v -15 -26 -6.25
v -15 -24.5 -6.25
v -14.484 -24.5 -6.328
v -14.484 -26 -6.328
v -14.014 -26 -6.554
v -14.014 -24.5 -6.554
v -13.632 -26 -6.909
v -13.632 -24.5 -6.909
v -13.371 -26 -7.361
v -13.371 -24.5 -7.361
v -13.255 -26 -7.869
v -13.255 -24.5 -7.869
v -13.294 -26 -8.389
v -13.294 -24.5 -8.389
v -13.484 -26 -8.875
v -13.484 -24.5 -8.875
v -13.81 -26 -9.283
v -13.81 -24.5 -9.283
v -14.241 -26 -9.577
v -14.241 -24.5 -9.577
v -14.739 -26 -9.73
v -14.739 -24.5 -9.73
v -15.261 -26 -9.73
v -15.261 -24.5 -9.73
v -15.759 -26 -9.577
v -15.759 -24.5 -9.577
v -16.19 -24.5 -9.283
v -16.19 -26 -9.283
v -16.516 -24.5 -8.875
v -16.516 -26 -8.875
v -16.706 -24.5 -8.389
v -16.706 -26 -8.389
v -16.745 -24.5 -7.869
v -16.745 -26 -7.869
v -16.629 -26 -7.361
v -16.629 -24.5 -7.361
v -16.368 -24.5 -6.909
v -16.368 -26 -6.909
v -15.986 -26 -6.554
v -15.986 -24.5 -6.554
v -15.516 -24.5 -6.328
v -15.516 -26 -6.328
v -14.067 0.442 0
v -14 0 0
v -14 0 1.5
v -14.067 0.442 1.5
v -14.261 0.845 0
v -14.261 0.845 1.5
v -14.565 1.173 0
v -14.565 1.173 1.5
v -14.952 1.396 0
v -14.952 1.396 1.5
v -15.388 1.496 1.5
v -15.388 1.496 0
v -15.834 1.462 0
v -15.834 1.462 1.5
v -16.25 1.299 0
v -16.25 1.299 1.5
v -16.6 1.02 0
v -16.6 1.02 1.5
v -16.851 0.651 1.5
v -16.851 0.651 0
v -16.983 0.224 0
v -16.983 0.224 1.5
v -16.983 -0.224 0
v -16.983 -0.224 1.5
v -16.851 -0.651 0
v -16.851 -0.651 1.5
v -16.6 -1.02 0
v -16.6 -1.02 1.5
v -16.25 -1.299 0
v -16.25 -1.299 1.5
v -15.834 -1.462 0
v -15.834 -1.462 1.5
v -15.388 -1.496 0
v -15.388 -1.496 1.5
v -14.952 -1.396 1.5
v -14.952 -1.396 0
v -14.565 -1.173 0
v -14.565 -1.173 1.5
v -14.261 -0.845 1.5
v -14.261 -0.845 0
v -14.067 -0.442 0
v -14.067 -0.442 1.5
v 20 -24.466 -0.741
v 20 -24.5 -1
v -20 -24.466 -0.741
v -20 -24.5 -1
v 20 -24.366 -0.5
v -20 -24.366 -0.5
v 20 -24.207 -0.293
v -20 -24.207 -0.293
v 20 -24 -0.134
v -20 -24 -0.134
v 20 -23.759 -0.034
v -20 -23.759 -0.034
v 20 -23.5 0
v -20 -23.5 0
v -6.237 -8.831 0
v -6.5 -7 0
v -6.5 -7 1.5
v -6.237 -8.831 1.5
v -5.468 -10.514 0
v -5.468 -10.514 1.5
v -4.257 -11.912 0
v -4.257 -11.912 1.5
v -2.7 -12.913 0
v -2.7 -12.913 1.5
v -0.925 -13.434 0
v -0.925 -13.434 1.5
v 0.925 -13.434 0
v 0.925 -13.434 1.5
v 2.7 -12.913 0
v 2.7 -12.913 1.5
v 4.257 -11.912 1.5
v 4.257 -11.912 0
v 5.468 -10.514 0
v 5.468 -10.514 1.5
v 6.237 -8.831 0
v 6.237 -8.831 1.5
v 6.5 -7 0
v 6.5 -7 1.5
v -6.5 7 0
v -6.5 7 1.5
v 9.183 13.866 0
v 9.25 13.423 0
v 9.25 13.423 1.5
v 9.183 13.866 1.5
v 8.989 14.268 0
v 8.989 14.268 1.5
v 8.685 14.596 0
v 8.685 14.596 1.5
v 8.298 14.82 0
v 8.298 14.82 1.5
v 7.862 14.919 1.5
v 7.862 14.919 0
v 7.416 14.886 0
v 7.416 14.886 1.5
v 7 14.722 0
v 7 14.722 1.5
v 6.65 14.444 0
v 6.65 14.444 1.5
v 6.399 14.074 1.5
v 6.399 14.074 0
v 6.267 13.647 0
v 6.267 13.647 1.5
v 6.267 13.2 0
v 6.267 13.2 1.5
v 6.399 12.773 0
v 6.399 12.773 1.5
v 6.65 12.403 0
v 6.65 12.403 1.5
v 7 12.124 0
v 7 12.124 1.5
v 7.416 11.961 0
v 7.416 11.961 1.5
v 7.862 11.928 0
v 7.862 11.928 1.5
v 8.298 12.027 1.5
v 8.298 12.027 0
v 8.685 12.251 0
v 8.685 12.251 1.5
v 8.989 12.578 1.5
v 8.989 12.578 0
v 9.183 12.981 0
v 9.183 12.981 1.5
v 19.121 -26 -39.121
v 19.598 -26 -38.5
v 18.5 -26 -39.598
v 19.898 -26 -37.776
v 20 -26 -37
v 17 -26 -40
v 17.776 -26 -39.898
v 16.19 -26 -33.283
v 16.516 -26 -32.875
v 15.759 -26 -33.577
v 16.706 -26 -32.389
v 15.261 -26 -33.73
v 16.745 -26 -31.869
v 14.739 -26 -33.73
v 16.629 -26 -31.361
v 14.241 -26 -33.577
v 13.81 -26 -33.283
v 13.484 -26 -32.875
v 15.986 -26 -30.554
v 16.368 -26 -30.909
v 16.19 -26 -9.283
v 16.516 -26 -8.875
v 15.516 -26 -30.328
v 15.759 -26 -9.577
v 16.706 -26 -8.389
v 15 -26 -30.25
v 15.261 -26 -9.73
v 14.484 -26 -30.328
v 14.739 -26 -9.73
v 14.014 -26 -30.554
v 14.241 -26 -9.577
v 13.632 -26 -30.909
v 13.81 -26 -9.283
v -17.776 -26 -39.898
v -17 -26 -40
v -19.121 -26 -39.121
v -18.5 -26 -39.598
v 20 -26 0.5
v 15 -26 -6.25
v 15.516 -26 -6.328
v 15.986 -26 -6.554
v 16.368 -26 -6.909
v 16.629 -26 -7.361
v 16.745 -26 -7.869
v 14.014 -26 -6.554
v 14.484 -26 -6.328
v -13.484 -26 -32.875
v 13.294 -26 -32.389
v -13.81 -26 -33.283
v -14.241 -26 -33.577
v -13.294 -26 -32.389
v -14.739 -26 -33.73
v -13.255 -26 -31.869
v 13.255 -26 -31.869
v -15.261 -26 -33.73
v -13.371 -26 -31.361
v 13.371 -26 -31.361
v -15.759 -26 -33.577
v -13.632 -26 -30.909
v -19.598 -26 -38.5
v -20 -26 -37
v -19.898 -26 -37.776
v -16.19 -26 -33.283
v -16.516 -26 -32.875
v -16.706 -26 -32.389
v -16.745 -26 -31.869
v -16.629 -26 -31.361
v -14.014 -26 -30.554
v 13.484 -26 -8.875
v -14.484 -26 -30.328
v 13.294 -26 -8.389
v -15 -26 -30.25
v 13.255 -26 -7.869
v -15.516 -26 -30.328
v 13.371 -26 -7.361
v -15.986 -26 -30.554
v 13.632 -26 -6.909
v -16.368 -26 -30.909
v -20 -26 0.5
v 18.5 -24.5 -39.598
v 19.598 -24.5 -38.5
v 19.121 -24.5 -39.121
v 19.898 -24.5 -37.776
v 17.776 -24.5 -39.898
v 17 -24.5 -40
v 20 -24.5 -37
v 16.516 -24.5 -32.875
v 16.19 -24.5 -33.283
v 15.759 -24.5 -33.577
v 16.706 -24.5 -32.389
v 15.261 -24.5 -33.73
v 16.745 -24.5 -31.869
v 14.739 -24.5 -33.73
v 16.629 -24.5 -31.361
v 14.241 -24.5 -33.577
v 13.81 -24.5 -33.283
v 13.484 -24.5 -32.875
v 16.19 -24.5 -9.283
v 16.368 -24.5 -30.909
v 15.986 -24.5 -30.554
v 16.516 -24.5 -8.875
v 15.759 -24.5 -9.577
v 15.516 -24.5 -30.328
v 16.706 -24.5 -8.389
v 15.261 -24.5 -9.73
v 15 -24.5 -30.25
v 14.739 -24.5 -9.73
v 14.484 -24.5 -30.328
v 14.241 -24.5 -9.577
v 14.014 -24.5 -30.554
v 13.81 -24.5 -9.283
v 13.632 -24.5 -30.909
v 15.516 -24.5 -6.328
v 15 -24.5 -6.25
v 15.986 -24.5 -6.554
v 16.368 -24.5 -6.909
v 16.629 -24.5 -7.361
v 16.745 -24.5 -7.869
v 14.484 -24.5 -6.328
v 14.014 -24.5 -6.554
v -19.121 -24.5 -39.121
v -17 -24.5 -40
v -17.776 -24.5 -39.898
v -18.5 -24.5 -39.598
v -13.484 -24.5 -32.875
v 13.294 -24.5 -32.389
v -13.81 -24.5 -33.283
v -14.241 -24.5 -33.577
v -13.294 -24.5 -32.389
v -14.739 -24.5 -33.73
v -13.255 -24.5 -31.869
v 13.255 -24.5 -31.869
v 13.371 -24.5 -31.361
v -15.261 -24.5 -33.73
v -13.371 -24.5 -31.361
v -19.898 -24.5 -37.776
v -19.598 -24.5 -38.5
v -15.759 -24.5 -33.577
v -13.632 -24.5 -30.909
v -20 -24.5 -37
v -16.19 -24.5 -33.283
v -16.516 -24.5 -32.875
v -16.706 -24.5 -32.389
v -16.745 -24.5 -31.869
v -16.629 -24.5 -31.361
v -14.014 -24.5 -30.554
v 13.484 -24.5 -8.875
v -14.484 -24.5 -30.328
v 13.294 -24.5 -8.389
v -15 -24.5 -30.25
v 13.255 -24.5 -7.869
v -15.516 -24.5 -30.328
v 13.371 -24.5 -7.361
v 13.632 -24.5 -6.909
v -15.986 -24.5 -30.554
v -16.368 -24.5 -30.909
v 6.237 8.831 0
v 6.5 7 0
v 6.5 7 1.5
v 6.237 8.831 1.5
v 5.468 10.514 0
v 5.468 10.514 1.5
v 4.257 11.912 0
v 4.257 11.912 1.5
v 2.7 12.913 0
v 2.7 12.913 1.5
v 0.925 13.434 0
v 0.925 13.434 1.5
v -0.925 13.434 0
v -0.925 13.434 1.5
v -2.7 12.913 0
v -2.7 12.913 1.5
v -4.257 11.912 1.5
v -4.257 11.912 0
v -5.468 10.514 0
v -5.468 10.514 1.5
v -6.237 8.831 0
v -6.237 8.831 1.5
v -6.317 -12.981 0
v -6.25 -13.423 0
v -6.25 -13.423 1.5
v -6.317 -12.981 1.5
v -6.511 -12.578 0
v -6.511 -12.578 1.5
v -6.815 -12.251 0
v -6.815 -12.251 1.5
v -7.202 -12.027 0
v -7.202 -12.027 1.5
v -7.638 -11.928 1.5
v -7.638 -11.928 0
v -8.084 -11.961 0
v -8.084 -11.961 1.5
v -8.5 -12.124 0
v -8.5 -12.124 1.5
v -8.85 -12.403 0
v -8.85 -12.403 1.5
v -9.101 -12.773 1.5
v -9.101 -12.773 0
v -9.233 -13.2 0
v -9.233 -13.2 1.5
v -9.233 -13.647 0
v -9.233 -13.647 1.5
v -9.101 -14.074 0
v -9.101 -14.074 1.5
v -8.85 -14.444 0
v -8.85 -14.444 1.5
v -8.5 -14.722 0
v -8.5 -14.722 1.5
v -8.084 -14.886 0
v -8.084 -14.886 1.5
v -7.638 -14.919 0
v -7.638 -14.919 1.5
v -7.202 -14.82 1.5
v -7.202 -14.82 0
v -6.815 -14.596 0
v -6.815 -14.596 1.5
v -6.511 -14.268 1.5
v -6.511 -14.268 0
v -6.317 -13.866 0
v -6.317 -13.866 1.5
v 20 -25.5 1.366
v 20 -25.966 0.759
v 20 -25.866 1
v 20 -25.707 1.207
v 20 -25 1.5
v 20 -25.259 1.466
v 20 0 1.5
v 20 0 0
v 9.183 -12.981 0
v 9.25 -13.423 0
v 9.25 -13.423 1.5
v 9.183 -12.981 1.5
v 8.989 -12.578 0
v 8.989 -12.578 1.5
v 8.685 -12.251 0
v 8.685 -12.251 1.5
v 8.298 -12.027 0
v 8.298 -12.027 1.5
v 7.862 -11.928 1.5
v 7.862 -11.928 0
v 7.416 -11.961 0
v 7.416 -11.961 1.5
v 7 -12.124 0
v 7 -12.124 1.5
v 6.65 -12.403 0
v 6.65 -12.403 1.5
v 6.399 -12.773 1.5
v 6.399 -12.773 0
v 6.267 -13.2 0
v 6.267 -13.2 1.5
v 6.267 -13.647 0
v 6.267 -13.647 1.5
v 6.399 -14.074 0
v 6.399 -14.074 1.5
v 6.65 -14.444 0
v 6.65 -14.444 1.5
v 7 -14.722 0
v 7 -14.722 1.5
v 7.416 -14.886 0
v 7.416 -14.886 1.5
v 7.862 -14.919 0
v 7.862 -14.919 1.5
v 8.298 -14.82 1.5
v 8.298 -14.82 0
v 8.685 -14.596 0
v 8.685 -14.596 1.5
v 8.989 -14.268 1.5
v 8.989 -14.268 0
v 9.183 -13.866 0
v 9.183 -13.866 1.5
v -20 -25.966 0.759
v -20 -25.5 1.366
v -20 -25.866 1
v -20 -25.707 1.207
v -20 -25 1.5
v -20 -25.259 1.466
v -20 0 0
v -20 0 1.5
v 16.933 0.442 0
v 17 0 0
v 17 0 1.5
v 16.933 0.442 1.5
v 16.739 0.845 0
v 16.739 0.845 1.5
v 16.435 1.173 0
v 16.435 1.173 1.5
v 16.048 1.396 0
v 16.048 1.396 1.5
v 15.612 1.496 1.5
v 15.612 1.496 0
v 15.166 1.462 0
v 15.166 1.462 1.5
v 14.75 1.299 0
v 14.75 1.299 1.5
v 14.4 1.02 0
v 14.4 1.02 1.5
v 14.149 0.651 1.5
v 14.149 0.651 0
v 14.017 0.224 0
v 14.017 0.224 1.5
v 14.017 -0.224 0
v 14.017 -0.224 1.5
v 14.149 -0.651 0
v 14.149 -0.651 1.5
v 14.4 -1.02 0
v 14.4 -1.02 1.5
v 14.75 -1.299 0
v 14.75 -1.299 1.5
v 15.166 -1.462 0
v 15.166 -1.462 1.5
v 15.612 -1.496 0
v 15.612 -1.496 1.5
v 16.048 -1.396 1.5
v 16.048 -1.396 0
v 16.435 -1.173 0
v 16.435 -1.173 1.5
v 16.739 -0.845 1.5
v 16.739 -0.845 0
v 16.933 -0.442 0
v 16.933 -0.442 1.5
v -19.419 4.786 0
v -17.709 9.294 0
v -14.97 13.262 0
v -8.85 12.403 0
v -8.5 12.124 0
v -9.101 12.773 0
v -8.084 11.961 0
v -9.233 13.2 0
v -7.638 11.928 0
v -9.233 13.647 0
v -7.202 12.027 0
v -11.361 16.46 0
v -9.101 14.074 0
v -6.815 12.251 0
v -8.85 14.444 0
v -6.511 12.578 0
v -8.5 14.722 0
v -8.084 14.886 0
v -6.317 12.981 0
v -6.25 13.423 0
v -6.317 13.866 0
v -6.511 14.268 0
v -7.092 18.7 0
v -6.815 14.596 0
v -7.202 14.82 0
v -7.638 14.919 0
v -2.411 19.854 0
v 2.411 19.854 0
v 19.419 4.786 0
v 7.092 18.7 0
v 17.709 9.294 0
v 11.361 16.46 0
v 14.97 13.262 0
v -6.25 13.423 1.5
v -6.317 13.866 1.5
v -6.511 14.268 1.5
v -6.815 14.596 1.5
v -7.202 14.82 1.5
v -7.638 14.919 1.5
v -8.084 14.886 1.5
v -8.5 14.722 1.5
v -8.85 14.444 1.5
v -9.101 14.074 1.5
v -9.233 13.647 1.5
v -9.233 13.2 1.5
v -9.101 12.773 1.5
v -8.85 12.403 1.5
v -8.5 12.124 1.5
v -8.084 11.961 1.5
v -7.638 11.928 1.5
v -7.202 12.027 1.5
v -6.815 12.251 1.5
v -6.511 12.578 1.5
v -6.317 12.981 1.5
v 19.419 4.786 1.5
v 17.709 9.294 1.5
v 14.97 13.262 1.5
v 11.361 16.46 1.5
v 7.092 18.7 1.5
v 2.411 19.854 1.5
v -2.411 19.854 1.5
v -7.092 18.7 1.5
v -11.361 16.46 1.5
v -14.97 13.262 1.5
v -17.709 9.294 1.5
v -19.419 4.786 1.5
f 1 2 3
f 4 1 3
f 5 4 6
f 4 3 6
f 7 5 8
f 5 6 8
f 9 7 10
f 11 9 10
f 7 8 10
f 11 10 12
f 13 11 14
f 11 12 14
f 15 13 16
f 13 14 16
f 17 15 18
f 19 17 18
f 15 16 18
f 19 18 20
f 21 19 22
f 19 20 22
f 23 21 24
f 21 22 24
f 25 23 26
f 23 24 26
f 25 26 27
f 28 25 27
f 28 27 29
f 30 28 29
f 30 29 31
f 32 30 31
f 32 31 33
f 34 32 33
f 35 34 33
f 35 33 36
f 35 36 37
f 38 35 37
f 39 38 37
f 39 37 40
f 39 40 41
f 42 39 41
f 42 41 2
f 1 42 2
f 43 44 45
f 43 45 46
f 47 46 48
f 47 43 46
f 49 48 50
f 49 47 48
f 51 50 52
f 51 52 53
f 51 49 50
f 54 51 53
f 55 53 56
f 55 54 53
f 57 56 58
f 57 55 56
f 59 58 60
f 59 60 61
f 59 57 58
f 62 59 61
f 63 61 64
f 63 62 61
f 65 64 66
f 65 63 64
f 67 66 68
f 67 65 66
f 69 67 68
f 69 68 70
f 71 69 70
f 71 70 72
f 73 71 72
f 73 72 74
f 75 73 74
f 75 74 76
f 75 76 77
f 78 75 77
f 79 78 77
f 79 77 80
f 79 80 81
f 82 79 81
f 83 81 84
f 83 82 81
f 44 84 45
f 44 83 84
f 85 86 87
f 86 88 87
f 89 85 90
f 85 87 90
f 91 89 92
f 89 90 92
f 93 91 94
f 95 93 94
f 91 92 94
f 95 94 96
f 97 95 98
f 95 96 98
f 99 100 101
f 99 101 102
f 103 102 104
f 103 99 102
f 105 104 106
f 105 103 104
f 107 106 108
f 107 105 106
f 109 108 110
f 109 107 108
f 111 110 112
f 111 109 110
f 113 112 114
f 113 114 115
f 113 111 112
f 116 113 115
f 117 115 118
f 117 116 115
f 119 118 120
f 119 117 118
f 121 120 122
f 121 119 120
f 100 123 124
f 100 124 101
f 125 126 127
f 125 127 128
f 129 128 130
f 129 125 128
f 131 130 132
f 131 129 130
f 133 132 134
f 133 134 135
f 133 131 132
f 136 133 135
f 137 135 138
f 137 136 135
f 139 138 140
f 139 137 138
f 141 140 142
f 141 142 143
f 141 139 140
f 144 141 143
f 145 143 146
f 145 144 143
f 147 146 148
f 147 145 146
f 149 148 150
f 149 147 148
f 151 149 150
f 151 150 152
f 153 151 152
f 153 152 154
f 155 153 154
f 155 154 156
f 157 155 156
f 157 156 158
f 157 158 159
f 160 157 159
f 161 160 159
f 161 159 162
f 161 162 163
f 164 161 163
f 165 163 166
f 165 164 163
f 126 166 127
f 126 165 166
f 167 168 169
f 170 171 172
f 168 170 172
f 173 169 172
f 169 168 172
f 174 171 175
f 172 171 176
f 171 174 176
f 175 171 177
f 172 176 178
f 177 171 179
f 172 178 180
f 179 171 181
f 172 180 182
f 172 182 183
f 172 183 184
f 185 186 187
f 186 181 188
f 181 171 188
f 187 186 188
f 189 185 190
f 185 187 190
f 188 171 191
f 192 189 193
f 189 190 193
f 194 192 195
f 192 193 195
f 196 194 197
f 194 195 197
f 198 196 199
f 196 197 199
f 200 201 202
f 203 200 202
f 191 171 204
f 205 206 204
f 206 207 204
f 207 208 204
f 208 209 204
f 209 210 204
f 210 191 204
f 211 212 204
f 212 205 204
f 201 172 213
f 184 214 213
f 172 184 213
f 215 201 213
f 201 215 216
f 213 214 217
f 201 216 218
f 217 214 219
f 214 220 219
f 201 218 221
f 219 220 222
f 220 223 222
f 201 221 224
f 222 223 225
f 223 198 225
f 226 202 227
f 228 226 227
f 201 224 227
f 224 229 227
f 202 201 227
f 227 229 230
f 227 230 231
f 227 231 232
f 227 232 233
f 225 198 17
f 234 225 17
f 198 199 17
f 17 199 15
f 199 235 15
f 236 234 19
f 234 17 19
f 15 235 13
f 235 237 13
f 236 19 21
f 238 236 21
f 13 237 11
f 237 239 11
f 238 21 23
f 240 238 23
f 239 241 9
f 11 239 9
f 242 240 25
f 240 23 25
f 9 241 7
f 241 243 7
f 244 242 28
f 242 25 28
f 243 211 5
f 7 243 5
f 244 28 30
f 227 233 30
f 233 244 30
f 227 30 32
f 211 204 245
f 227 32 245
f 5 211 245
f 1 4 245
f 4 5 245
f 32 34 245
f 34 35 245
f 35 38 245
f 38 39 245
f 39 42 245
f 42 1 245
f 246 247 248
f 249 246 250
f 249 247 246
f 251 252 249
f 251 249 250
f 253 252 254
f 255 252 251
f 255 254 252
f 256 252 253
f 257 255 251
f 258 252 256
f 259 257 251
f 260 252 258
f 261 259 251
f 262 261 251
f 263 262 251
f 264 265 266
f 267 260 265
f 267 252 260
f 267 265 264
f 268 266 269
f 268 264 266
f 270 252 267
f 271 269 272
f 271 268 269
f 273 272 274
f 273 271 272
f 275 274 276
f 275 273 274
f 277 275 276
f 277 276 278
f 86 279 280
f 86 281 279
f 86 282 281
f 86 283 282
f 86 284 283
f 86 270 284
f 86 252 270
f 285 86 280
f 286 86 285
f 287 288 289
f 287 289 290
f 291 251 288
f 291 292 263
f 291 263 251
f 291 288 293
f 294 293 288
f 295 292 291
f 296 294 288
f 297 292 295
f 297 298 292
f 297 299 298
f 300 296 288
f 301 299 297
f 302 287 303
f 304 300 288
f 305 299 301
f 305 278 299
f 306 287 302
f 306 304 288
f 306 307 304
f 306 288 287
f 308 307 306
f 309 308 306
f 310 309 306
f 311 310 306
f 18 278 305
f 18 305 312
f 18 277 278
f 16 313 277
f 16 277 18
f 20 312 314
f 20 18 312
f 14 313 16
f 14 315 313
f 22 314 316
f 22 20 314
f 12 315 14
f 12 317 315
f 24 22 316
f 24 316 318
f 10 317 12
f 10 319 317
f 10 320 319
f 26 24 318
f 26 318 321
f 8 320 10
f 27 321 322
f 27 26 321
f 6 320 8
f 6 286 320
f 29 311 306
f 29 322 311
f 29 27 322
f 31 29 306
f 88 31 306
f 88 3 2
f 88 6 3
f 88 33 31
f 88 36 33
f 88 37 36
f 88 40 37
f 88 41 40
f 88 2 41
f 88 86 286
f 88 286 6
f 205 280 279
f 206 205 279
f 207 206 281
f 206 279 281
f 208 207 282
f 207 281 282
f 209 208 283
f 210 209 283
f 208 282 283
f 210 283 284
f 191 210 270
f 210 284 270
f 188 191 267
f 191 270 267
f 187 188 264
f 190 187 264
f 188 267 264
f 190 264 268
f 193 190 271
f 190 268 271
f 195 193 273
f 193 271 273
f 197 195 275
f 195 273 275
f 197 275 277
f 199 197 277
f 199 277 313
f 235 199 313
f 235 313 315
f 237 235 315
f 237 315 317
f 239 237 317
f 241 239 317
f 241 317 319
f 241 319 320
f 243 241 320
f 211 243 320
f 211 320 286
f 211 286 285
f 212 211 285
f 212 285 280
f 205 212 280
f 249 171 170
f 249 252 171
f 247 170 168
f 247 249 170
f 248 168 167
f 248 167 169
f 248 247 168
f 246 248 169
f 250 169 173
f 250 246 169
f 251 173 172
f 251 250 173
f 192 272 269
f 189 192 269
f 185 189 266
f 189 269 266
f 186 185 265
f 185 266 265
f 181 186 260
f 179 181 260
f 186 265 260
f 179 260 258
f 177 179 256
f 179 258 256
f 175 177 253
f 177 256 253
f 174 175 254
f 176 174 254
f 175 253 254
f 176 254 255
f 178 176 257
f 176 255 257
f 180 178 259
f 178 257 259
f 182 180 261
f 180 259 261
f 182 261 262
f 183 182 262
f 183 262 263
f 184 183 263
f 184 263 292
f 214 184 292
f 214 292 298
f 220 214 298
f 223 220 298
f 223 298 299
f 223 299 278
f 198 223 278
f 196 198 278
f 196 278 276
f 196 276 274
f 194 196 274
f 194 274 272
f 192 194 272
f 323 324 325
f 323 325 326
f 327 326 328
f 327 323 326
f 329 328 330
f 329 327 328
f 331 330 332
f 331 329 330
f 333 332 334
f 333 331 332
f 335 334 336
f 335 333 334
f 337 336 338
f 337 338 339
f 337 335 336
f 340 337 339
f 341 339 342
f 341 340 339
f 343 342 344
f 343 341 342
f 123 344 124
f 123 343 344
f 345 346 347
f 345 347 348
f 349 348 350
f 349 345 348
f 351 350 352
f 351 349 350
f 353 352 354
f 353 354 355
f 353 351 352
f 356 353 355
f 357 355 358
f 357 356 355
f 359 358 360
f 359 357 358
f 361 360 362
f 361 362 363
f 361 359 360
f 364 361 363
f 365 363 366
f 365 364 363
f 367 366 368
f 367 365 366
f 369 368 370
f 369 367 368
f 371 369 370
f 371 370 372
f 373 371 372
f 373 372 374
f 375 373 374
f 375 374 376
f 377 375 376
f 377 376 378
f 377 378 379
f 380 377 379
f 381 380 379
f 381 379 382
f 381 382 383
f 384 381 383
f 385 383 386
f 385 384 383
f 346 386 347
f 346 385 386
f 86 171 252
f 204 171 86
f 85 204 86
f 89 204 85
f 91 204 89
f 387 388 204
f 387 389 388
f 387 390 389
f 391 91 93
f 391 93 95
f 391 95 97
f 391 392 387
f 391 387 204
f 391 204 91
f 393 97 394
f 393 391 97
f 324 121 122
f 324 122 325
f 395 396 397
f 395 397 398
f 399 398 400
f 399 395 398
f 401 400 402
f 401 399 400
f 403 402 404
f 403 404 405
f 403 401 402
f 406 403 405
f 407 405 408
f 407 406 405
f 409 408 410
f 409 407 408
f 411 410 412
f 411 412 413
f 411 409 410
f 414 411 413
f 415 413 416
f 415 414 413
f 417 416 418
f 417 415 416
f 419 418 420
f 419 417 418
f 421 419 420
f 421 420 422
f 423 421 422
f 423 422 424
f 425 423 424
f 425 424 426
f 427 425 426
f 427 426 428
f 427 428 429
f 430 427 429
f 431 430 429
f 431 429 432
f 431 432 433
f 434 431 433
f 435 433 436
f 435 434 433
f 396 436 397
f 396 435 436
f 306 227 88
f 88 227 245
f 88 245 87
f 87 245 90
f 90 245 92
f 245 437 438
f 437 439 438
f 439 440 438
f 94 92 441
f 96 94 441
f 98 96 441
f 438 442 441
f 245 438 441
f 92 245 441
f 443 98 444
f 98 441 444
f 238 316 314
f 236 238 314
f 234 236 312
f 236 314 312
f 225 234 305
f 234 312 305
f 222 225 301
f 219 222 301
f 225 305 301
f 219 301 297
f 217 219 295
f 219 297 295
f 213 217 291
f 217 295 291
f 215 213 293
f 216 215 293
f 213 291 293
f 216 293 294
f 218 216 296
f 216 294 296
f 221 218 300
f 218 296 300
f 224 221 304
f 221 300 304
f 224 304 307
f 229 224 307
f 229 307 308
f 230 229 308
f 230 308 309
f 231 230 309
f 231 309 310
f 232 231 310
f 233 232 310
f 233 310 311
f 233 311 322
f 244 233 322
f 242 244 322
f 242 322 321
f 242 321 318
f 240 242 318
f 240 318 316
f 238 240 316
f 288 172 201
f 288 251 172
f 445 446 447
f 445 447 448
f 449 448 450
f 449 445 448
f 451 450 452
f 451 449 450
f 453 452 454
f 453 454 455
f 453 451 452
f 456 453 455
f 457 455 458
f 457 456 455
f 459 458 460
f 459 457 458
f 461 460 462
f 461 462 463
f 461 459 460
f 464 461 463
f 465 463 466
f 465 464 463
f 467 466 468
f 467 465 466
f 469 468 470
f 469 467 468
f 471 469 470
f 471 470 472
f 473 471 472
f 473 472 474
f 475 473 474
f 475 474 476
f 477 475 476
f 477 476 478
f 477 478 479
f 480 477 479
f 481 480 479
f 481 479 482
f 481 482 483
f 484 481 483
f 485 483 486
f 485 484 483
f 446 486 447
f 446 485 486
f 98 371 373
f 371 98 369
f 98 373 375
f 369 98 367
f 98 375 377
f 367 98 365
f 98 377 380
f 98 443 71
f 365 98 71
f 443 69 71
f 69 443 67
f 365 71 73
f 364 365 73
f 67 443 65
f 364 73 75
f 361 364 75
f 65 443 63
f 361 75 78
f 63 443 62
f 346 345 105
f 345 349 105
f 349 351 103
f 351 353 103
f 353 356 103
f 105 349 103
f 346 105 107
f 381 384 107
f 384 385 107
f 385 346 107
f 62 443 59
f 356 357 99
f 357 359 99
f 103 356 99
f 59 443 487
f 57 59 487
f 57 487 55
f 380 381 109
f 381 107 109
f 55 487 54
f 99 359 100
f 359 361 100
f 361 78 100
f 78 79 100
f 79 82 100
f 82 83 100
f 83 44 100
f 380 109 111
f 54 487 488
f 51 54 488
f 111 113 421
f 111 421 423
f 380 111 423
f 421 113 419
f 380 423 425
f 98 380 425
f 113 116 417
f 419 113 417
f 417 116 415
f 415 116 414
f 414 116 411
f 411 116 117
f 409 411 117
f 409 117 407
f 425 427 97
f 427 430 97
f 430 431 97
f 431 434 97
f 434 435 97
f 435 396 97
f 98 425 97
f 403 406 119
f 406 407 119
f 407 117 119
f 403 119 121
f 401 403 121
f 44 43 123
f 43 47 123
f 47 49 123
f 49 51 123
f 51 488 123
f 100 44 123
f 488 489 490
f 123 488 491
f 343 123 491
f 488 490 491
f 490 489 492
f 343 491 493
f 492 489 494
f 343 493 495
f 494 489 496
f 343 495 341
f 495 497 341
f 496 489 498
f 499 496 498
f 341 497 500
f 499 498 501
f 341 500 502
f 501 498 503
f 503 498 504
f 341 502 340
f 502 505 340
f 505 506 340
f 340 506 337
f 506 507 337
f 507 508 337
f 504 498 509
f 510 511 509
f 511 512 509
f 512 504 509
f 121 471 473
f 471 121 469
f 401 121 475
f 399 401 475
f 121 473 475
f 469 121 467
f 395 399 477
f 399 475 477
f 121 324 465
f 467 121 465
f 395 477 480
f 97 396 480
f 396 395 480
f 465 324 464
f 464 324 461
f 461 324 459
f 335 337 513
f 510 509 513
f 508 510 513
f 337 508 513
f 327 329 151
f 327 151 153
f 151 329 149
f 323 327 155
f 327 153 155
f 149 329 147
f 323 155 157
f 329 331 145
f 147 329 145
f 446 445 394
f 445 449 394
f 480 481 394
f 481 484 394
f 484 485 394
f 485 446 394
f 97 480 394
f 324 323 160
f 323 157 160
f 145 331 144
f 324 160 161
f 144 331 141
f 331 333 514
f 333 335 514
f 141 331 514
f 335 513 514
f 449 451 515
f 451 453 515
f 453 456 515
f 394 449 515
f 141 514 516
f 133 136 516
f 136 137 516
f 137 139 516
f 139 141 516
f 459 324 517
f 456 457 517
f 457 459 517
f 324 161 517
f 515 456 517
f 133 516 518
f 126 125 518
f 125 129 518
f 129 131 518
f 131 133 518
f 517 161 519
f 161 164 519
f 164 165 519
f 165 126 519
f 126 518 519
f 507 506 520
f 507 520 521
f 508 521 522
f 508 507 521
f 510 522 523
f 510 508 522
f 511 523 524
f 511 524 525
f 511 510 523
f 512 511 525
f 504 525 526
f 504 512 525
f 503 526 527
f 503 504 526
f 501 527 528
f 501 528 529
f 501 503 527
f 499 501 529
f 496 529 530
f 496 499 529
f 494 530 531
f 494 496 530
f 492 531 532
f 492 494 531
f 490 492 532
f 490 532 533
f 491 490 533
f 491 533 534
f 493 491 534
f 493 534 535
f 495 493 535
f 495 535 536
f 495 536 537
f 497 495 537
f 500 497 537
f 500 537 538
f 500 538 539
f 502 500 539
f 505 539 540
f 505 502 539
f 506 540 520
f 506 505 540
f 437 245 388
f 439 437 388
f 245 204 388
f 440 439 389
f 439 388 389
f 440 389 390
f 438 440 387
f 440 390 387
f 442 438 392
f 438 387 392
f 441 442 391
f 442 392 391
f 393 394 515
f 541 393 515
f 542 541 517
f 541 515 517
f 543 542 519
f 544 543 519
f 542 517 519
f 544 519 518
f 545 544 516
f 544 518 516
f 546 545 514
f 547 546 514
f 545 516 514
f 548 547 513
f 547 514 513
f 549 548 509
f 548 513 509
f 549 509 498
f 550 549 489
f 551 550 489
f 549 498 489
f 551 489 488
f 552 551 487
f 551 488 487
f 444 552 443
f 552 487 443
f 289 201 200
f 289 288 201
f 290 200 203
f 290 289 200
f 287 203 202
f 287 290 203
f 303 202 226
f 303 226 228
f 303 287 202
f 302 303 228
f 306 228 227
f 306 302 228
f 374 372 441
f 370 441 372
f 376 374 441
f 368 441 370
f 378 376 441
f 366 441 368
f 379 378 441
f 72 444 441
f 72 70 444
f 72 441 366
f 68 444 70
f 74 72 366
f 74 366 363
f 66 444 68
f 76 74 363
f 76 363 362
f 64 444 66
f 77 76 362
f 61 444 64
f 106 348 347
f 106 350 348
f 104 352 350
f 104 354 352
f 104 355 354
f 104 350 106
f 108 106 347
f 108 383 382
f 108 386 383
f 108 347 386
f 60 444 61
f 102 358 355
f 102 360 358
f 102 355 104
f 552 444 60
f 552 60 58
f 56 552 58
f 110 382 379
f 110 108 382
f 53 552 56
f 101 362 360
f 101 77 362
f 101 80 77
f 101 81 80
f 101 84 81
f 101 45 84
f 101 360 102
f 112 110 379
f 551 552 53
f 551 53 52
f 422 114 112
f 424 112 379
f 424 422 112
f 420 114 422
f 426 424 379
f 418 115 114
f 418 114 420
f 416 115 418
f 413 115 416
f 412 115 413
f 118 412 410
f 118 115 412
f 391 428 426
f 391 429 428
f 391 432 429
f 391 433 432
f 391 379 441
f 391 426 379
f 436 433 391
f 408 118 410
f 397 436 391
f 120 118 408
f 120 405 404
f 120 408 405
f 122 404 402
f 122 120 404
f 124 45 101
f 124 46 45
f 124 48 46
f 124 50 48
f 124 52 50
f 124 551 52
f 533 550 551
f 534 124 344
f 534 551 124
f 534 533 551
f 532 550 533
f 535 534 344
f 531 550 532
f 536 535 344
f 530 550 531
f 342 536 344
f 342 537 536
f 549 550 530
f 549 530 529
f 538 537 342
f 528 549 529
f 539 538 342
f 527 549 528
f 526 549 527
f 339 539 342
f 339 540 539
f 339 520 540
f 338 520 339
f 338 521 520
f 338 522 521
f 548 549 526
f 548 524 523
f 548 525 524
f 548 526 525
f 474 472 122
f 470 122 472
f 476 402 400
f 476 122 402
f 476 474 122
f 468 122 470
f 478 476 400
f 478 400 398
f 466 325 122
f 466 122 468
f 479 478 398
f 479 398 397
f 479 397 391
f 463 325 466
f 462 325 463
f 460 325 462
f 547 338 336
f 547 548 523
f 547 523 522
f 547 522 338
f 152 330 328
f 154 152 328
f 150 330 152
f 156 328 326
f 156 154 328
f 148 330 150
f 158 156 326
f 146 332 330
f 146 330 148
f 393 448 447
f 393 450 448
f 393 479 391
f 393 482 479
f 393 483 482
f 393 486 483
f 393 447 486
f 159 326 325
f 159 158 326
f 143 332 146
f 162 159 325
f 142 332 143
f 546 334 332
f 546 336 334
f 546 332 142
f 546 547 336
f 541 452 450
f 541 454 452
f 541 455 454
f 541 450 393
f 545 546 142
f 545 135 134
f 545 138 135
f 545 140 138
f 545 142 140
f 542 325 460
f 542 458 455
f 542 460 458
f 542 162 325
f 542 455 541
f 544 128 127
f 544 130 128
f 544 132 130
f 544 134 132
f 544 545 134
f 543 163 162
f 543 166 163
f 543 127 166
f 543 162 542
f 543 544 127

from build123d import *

# Parameters (mm, degrees)
SKETCH_1_R          = 1.5
EXTRUDE_1_DEPTH     = 1.5
SKETCH_2_W          = 40
SKETCH_2_H          = 1.5
EXTRUDE_2_DEPTH     = 40
SKETCH_3_R          = 1.75
CUT_EXTRUDE_1_DEPTH = 40
FILLET_1_R          = 3
FILLET_2_R          = 1


with BuildPart() as part:
    # 草图1 → 凸台-拉伸1 (new body)
    with BuildSketch(Plane.XY):
        with BuildLine():
            Line((-20, 0), (-20, -26))
            Line((-20, -26), (20, -26))
            Line((20, -26), (20, 0))
            ThreePointArc((20, 0), (0, 20), (-20, 0))
        make_face()
        with Locations((-7.75, 13.423393759)):
            Circle(SKETCH_1_R, mode=Mode.SUBTRACT)
        with Locations((7.75, 13.423393759)):
            Circle(SKETCH_1_R, mode=Mode.SUBTRACT)
        with Locations((15.5, 0)):
            Circle(SKETCH_1_R, mode=Mode.SUBTRACT)
        with Locations((7.75, -13.423393759)):
            Circle(SKETCH_1_R, mode=Mode.SUBTRACT)
        with Locations((-7.75, -13.423393759)):
            Circle(SKETCH_1_R, mode=Mode.SUBTRACT)
        with Locations((-15.5, 0)):
            Circle(SKETCH_1_R, mode=Mode.SUBTRACT)
        with BuildLine():
            Line((-6.5, 7), (-6.5, -7))
            ThreePointArc((-6.5, -7), (0, -13.5), (6.5, -7))
            Line((6.5, -7), (6.5, 7))
            ThreePointArc((6.5, 7), (0, 13.5), (-6.5, 7))
        make_face(mode=Mode.SUBTRACT)
    extrude(amount=EXTRUDE_1_DEPTH)

    # 草图2 → 凸台-拉伸2 (add)
    with BuildSketch(Plane(origin=(0, 0, 0), x_dir=(-1, 0, 0), z_dir=(0, 0, -1))):
        with Locations((0, -25.25)):
            Rectangle(SKETCH_2_W, SKETCH_2_H)
    extrude(amount=EXTRUDE_2_DEPTH)

    # 草图3 → 切除-拉伸1 (cut)
    with BuildSketch(Plane(origin=(0, -24.5, 0), x_dir=(1, 0, 0), z_dir=(0, 1, 0))):
        with Locations(Location((-15, 32, 0), (0, 0, 270))):
            Circle(SKETCH_3_R)
        with Locations(Location((-15, 8, 0), (0, 0, 270))):
            Circle(SKETCH_3_R)
        with Locations(Location((15, 8, 0), (0, 0, 270))):
            Circle(SKETCH_3_R)
        with Locations(Location((15, 32, 0), (0, 0, 270))):
            Circle(SKETCH_3_R)
    extrude(amount=-CUT_EXTRUDE_1_DEPTH, mode=Mode.SUBTRACT)

    # 圆角1
    fillet_1_edges = [part.edges().sort_by_distance(p)[0] for p in [
        (20, -25.25, -40),
        (-20, -25.25, -40),
    ]]
    fillet(fillet_1_edges, radius=FILLET_1_R)

    # 圆角2
    fillet_2_edges = [part.edges().sort_by_distance(p)[0] for p in [
        (0, -24.5, 0),
        (0, -26, 1.5),
    ]]
    fillet(fillet_2_edges, radius=FILLET_2_R)


solid = part.part
